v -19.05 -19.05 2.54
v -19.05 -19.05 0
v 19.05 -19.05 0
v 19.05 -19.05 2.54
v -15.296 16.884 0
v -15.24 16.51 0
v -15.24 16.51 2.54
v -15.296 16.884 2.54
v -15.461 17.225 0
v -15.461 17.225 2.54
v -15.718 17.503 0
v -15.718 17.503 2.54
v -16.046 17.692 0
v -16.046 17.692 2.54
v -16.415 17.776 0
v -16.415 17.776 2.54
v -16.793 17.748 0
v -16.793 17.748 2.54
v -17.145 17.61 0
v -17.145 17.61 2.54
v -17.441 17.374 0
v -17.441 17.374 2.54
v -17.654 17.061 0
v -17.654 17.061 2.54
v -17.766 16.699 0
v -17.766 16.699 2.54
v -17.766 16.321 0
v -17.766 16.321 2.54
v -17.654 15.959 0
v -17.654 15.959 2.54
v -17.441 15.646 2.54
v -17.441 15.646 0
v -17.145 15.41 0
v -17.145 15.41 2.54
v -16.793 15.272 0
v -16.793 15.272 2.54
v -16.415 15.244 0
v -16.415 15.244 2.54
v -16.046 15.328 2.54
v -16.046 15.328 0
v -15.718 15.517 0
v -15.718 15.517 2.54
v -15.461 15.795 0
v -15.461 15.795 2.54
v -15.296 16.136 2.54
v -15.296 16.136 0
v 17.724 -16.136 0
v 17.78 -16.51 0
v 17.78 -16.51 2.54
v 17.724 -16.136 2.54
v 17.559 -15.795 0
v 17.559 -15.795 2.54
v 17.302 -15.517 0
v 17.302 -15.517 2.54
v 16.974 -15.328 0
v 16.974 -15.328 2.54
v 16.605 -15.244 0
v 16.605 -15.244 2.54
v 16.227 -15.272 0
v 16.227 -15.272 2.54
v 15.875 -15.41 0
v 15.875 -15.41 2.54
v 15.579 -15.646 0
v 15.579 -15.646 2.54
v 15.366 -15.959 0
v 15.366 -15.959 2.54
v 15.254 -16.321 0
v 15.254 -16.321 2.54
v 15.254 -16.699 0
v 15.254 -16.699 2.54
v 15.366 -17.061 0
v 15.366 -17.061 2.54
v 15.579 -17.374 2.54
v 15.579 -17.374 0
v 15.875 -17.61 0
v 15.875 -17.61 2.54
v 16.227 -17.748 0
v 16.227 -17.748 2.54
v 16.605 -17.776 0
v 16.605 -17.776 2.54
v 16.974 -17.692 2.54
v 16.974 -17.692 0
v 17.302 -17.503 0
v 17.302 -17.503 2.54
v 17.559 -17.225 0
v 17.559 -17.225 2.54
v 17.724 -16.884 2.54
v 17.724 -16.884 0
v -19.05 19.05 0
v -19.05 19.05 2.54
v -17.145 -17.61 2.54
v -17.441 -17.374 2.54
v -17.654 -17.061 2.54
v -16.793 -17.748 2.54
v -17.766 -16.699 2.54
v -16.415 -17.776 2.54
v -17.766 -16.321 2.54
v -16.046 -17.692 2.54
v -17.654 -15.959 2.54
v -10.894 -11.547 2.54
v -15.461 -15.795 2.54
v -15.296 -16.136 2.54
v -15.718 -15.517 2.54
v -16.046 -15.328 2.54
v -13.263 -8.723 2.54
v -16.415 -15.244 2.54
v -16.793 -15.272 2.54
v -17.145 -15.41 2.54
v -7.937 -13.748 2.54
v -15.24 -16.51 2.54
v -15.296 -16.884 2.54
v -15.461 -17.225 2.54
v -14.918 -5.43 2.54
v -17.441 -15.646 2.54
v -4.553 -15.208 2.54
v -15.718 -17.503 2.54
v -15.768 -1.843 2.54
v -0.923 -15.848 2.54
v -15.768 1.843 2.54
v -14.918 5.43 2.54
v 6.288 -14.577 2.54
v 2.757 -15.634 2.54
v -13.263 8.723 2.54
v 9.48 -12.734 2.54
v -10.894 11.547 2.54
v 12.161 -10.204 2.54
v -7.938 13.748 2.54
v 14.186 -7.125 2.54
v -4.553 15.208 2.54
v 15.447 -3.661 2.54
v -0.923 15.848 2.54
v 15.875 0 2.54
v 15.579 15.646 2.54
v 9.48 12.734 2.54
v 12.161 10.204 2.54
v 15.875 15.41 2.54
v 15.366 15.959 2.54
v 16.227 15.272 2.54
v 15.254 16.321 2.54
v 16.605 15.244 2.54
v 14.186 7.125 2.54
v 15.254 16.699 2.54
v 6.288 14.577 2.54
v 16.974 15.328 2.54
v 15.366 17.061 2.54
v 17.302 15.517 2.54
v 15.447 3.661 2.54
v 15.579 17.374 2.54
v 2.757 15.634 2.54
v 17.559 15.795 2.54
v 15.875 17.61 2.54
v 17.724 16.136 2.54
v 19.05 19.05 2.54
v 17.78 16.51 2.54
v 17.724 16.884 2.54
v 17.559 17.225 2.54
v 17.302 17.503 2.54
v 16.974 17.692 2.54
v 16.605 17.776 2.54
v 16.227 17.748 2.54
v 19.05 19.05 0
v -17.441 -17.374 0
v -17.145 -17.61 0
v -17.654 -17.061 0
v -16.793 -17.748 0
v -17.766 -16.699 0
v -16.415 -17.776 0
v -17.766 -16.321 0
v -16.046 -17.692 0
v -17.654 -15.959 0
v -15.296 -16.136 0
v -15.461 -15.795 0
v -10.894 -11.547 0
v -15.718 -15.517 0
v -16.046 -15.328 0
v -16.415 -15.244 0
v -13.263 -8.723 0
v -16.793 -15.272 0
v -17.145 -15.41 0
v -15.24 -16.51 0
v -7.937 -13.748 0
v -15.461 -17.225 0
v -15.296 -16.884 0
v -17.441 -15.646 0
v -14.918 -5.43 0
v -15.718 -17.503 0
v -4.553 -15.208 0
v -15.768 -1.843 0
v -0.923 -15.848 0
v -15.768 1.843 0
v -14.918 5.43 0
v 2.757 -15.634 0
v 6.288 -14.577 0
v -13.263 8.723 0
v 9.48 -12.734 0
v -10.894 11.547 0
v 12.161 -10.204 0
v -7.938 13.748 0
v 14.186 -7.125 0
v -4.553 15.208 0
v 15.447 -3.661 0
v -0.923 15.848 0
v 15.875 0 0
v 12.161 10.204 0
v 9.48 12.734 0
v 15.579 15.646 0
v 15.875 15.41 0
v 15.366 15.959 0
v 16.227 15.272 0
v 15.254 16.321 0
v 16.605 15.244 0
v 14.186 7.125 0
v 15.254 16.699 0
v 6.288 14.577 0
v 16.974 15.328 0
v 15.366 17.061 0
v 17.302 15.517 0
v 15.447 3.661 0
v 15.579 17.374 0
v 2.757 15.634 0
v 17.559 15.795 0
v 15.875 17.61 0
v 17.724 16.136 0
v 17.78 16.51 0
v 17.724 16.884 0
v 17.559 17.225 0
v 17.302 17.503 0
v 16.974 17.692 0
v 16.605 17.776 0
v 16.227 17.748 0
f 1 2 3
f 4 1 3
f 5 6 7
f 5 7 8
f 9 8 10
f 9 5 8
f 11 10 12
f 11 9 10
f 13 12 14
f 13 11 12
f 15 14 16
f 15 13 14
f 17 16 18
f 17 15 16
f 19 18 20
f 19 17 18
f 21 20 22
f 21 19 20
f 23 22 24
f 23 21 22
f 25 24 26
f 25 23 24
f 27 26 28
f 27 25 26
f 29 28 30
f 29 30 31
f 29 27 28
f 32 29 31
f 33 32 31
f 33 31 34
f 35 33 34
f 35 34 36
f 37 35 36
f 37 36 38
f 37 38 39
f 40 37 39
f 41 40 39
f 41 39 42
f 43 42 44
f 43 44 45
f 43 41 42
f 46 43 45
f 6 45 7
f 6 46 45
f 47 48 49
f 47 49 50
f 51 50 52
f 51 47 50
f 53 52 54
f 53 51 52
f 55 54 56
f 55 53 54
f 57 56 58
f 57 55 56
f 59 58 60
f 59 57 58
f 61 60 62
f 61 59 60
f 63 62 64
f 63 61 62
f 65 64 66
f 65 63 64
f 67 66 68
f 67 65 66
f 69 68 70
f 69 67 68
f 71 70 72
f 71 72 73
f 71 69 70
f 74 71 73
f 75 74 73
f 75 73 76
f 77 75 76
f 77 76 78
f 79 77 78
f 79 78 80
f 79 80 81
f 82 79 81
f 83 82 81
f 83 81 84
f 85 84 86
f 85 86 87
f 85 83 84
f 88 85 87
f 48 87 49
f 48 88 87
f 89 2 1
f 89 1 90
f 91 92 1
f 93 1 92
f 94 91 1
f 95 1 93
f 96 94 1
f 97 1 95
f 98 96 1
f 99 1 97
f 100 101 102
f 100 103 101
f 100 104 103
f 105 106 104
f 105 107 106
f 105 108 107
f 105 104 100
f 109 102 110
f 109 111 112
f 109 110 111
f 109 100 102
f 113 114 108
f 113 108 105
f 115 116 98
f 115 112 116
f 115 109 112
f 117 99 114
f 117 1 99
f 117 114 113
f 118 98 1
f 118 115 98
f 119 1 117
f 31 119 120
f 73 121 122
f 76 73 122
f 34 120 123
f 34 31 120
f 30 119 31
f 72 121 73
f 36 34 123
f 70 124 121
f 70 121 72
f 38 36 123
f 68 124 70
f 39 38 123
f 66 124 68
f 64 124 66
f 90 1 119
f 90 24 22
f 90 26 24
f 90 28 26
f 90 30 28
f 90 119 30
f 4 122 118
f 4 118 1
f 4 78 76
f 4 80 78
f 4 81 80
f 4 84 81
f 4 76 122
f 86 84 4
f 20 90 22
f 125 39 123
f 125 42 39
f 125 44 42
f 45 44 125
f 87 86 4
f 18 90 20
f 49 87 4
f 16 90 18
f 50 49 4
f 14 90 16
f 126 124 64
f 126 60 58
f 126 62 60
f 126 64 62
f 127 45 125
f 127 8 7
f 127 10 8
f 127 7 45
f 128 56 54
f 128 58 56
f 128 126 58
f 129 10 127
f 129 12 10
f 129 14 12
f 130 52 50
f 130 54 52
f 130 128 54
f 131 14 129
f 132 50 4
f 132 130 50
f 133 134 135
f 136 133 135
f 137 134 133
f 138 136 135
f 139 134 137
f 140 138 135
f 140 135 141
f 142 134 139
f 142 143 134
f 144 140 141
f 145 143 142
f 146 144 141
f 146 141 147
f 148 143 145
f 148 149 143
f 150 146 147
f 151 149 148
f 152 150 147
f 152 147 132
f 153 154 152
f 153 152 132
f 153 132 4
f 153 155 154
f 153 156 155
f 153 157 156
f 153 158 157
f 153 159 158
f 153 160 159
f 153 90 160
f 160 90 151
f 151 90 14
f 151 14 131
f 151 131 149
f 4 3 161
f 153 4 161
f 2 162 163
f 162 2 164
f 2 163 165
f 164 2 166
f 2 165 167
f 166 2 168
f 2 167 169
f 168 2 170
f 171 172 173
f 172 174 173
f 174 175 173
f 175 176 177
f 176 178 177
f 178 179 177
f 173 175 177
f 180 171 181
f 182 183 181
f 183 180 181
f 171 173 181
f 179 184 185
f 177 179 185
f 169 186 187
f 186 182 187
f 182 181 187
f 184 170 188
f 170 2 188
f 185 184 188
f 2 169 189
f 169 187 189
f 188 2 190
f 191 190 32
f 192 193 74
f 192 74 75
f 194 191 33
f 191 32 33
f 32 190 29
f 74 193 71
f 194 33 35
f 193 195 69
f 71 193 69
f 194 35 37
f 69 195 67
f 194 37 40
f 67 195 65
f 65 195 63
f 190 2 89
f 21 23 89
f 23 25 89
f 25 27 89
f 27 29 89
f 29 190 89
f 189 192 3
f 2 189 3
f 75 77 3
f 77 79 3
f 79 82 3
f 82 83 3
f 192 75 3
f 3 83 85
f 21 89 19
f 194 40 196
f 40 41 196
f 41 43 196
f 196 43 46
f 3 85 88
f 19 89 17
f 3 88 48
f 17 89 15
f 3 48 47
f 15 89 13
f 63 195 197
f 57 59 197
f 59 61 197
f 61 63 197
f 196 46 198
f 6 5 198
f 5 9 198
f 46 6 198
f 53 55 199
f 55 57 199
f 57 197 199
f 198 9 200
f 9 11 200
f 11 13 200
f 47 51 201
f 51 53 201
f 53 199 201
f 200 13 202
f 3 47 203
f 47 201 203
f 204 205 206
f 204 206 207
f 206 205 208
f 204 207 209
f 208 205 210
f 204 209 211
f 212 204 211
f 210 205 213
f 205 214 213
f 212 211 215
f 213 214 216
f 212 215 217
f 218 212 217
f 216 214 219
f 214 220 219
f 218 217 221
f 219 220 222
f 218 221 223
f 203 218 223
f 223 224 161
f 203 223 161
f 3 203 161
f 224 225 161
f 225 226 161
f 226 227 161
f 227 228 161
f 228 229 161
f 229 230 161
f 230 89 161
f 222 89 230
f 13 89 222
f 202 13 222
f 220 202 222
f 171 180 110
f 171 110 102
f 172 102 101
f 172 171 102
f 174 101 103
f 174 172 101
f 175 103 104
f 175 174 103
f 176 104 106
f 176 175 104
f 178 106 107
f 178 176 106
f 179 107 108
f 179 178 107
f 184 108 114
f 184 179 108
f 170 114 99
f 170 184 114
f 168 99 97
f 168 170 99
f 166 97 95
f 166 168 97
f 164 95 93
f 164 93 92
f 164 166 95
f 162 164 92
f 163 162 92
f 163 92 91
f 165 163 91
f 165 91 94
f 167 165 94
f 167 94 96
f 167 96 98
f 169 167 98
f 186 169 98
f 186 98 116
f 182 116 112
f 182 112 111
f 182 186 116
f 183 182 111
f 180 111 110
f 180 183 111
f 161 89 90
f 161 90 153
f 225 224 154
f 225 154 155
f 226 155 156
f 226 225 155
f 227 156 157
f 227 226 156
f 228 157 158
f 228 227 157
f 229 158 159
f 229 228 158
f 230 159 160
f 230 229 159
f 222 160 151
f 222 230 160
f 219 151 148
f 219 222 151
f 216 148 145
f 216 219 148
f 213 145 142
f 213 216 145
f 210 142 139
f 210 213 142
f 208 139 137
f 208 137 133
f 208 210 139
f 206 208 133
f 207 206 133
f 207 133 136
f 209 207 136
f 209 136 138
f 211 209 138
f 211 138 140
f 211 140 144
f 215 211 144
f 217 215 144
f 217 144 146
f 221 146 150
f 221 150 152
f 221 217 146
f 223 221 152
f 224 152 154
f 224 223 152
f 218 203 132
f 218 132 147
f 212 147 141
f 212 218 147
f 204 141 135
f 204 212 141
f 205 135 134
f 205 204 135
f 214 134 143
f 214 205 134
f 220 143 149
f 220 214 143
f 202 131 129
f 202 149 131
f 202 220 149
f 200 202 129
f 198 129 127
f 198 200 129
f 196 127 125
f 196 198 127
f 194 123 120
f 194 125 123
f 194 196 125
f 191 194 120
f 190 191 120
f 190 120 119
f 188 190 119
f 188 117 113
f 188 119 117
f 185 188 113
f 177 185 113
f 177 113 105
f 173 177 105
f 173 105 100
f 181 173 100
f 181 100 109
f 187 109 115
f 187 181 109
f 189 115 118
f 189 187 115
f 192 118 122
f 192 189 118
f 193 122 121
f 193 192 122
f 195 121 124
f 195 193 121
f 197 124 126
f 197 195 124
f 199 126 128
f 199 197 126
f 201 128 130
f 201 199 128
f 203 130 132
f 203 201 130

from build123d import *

# Parameters (mm, degrees)
SKETCH1_W               = 38.1
SKETCH1_H               = 38.1
BOSS_EXTRUDE1_DEPTH     = 2.54
CUT_EXTRUDE1_DEPTH      = 28.060240206
CUT_EXTRUDE1_DEPTH_BACK = 28.060240206
SKETCH2_R               = 15.875
HOLE1_OUTLINE_R         = 1.27
HOLE1_DEPTH             = 2.54


# Read off the part's stored shape, not the designer's step: Hole1
with BuildPart() as part:
    # Sketch1 → Boss-Extrude1 (new body)
    with BuildSketch(Plane.XY):
        Rectangle(SKETCH1_W, SKETCH1_H)
    extrude(amount=BOSS_EXTRUDE1_DEPTH)

    # Sketch2 → Cut-Extrude1 (cut, two sides: drawn at the far end of the back side and taken through both)
    with BuildSketch(Plane.XY.offset(2.54).offset(-CUT_EXTRUDE1_DEPTH_BACK)):
        Circle(SKETCH2_R)
    extrude(amount=CUT_EXTRUDE1_DEPTH + CUT_EXTRUDE1_DEPTH_BACK, mode=Mode.SUBTRACT)

    # Hole1 outline → Hole1 (cut)
    with BuildSketch(Plane.XY):
        with Locations((-16.51, 16.51)):
            Circle(HOLE1_OUTLINE_R)
        with Locations((16.51, 16.51)):
            Circle(HOLE1_OUTLINE_R)
        with Locations((16.51, -16.51)):
            Circle(HOLE1_OUTLINE_R)
        with Locations((-16.51, -16.51)):
            Circle(HOLE1_OUTLINE_R)
    extrude(amount=HOLE1_DEPTH, mode=Mode.SUBTRACT)


solid = part.part
